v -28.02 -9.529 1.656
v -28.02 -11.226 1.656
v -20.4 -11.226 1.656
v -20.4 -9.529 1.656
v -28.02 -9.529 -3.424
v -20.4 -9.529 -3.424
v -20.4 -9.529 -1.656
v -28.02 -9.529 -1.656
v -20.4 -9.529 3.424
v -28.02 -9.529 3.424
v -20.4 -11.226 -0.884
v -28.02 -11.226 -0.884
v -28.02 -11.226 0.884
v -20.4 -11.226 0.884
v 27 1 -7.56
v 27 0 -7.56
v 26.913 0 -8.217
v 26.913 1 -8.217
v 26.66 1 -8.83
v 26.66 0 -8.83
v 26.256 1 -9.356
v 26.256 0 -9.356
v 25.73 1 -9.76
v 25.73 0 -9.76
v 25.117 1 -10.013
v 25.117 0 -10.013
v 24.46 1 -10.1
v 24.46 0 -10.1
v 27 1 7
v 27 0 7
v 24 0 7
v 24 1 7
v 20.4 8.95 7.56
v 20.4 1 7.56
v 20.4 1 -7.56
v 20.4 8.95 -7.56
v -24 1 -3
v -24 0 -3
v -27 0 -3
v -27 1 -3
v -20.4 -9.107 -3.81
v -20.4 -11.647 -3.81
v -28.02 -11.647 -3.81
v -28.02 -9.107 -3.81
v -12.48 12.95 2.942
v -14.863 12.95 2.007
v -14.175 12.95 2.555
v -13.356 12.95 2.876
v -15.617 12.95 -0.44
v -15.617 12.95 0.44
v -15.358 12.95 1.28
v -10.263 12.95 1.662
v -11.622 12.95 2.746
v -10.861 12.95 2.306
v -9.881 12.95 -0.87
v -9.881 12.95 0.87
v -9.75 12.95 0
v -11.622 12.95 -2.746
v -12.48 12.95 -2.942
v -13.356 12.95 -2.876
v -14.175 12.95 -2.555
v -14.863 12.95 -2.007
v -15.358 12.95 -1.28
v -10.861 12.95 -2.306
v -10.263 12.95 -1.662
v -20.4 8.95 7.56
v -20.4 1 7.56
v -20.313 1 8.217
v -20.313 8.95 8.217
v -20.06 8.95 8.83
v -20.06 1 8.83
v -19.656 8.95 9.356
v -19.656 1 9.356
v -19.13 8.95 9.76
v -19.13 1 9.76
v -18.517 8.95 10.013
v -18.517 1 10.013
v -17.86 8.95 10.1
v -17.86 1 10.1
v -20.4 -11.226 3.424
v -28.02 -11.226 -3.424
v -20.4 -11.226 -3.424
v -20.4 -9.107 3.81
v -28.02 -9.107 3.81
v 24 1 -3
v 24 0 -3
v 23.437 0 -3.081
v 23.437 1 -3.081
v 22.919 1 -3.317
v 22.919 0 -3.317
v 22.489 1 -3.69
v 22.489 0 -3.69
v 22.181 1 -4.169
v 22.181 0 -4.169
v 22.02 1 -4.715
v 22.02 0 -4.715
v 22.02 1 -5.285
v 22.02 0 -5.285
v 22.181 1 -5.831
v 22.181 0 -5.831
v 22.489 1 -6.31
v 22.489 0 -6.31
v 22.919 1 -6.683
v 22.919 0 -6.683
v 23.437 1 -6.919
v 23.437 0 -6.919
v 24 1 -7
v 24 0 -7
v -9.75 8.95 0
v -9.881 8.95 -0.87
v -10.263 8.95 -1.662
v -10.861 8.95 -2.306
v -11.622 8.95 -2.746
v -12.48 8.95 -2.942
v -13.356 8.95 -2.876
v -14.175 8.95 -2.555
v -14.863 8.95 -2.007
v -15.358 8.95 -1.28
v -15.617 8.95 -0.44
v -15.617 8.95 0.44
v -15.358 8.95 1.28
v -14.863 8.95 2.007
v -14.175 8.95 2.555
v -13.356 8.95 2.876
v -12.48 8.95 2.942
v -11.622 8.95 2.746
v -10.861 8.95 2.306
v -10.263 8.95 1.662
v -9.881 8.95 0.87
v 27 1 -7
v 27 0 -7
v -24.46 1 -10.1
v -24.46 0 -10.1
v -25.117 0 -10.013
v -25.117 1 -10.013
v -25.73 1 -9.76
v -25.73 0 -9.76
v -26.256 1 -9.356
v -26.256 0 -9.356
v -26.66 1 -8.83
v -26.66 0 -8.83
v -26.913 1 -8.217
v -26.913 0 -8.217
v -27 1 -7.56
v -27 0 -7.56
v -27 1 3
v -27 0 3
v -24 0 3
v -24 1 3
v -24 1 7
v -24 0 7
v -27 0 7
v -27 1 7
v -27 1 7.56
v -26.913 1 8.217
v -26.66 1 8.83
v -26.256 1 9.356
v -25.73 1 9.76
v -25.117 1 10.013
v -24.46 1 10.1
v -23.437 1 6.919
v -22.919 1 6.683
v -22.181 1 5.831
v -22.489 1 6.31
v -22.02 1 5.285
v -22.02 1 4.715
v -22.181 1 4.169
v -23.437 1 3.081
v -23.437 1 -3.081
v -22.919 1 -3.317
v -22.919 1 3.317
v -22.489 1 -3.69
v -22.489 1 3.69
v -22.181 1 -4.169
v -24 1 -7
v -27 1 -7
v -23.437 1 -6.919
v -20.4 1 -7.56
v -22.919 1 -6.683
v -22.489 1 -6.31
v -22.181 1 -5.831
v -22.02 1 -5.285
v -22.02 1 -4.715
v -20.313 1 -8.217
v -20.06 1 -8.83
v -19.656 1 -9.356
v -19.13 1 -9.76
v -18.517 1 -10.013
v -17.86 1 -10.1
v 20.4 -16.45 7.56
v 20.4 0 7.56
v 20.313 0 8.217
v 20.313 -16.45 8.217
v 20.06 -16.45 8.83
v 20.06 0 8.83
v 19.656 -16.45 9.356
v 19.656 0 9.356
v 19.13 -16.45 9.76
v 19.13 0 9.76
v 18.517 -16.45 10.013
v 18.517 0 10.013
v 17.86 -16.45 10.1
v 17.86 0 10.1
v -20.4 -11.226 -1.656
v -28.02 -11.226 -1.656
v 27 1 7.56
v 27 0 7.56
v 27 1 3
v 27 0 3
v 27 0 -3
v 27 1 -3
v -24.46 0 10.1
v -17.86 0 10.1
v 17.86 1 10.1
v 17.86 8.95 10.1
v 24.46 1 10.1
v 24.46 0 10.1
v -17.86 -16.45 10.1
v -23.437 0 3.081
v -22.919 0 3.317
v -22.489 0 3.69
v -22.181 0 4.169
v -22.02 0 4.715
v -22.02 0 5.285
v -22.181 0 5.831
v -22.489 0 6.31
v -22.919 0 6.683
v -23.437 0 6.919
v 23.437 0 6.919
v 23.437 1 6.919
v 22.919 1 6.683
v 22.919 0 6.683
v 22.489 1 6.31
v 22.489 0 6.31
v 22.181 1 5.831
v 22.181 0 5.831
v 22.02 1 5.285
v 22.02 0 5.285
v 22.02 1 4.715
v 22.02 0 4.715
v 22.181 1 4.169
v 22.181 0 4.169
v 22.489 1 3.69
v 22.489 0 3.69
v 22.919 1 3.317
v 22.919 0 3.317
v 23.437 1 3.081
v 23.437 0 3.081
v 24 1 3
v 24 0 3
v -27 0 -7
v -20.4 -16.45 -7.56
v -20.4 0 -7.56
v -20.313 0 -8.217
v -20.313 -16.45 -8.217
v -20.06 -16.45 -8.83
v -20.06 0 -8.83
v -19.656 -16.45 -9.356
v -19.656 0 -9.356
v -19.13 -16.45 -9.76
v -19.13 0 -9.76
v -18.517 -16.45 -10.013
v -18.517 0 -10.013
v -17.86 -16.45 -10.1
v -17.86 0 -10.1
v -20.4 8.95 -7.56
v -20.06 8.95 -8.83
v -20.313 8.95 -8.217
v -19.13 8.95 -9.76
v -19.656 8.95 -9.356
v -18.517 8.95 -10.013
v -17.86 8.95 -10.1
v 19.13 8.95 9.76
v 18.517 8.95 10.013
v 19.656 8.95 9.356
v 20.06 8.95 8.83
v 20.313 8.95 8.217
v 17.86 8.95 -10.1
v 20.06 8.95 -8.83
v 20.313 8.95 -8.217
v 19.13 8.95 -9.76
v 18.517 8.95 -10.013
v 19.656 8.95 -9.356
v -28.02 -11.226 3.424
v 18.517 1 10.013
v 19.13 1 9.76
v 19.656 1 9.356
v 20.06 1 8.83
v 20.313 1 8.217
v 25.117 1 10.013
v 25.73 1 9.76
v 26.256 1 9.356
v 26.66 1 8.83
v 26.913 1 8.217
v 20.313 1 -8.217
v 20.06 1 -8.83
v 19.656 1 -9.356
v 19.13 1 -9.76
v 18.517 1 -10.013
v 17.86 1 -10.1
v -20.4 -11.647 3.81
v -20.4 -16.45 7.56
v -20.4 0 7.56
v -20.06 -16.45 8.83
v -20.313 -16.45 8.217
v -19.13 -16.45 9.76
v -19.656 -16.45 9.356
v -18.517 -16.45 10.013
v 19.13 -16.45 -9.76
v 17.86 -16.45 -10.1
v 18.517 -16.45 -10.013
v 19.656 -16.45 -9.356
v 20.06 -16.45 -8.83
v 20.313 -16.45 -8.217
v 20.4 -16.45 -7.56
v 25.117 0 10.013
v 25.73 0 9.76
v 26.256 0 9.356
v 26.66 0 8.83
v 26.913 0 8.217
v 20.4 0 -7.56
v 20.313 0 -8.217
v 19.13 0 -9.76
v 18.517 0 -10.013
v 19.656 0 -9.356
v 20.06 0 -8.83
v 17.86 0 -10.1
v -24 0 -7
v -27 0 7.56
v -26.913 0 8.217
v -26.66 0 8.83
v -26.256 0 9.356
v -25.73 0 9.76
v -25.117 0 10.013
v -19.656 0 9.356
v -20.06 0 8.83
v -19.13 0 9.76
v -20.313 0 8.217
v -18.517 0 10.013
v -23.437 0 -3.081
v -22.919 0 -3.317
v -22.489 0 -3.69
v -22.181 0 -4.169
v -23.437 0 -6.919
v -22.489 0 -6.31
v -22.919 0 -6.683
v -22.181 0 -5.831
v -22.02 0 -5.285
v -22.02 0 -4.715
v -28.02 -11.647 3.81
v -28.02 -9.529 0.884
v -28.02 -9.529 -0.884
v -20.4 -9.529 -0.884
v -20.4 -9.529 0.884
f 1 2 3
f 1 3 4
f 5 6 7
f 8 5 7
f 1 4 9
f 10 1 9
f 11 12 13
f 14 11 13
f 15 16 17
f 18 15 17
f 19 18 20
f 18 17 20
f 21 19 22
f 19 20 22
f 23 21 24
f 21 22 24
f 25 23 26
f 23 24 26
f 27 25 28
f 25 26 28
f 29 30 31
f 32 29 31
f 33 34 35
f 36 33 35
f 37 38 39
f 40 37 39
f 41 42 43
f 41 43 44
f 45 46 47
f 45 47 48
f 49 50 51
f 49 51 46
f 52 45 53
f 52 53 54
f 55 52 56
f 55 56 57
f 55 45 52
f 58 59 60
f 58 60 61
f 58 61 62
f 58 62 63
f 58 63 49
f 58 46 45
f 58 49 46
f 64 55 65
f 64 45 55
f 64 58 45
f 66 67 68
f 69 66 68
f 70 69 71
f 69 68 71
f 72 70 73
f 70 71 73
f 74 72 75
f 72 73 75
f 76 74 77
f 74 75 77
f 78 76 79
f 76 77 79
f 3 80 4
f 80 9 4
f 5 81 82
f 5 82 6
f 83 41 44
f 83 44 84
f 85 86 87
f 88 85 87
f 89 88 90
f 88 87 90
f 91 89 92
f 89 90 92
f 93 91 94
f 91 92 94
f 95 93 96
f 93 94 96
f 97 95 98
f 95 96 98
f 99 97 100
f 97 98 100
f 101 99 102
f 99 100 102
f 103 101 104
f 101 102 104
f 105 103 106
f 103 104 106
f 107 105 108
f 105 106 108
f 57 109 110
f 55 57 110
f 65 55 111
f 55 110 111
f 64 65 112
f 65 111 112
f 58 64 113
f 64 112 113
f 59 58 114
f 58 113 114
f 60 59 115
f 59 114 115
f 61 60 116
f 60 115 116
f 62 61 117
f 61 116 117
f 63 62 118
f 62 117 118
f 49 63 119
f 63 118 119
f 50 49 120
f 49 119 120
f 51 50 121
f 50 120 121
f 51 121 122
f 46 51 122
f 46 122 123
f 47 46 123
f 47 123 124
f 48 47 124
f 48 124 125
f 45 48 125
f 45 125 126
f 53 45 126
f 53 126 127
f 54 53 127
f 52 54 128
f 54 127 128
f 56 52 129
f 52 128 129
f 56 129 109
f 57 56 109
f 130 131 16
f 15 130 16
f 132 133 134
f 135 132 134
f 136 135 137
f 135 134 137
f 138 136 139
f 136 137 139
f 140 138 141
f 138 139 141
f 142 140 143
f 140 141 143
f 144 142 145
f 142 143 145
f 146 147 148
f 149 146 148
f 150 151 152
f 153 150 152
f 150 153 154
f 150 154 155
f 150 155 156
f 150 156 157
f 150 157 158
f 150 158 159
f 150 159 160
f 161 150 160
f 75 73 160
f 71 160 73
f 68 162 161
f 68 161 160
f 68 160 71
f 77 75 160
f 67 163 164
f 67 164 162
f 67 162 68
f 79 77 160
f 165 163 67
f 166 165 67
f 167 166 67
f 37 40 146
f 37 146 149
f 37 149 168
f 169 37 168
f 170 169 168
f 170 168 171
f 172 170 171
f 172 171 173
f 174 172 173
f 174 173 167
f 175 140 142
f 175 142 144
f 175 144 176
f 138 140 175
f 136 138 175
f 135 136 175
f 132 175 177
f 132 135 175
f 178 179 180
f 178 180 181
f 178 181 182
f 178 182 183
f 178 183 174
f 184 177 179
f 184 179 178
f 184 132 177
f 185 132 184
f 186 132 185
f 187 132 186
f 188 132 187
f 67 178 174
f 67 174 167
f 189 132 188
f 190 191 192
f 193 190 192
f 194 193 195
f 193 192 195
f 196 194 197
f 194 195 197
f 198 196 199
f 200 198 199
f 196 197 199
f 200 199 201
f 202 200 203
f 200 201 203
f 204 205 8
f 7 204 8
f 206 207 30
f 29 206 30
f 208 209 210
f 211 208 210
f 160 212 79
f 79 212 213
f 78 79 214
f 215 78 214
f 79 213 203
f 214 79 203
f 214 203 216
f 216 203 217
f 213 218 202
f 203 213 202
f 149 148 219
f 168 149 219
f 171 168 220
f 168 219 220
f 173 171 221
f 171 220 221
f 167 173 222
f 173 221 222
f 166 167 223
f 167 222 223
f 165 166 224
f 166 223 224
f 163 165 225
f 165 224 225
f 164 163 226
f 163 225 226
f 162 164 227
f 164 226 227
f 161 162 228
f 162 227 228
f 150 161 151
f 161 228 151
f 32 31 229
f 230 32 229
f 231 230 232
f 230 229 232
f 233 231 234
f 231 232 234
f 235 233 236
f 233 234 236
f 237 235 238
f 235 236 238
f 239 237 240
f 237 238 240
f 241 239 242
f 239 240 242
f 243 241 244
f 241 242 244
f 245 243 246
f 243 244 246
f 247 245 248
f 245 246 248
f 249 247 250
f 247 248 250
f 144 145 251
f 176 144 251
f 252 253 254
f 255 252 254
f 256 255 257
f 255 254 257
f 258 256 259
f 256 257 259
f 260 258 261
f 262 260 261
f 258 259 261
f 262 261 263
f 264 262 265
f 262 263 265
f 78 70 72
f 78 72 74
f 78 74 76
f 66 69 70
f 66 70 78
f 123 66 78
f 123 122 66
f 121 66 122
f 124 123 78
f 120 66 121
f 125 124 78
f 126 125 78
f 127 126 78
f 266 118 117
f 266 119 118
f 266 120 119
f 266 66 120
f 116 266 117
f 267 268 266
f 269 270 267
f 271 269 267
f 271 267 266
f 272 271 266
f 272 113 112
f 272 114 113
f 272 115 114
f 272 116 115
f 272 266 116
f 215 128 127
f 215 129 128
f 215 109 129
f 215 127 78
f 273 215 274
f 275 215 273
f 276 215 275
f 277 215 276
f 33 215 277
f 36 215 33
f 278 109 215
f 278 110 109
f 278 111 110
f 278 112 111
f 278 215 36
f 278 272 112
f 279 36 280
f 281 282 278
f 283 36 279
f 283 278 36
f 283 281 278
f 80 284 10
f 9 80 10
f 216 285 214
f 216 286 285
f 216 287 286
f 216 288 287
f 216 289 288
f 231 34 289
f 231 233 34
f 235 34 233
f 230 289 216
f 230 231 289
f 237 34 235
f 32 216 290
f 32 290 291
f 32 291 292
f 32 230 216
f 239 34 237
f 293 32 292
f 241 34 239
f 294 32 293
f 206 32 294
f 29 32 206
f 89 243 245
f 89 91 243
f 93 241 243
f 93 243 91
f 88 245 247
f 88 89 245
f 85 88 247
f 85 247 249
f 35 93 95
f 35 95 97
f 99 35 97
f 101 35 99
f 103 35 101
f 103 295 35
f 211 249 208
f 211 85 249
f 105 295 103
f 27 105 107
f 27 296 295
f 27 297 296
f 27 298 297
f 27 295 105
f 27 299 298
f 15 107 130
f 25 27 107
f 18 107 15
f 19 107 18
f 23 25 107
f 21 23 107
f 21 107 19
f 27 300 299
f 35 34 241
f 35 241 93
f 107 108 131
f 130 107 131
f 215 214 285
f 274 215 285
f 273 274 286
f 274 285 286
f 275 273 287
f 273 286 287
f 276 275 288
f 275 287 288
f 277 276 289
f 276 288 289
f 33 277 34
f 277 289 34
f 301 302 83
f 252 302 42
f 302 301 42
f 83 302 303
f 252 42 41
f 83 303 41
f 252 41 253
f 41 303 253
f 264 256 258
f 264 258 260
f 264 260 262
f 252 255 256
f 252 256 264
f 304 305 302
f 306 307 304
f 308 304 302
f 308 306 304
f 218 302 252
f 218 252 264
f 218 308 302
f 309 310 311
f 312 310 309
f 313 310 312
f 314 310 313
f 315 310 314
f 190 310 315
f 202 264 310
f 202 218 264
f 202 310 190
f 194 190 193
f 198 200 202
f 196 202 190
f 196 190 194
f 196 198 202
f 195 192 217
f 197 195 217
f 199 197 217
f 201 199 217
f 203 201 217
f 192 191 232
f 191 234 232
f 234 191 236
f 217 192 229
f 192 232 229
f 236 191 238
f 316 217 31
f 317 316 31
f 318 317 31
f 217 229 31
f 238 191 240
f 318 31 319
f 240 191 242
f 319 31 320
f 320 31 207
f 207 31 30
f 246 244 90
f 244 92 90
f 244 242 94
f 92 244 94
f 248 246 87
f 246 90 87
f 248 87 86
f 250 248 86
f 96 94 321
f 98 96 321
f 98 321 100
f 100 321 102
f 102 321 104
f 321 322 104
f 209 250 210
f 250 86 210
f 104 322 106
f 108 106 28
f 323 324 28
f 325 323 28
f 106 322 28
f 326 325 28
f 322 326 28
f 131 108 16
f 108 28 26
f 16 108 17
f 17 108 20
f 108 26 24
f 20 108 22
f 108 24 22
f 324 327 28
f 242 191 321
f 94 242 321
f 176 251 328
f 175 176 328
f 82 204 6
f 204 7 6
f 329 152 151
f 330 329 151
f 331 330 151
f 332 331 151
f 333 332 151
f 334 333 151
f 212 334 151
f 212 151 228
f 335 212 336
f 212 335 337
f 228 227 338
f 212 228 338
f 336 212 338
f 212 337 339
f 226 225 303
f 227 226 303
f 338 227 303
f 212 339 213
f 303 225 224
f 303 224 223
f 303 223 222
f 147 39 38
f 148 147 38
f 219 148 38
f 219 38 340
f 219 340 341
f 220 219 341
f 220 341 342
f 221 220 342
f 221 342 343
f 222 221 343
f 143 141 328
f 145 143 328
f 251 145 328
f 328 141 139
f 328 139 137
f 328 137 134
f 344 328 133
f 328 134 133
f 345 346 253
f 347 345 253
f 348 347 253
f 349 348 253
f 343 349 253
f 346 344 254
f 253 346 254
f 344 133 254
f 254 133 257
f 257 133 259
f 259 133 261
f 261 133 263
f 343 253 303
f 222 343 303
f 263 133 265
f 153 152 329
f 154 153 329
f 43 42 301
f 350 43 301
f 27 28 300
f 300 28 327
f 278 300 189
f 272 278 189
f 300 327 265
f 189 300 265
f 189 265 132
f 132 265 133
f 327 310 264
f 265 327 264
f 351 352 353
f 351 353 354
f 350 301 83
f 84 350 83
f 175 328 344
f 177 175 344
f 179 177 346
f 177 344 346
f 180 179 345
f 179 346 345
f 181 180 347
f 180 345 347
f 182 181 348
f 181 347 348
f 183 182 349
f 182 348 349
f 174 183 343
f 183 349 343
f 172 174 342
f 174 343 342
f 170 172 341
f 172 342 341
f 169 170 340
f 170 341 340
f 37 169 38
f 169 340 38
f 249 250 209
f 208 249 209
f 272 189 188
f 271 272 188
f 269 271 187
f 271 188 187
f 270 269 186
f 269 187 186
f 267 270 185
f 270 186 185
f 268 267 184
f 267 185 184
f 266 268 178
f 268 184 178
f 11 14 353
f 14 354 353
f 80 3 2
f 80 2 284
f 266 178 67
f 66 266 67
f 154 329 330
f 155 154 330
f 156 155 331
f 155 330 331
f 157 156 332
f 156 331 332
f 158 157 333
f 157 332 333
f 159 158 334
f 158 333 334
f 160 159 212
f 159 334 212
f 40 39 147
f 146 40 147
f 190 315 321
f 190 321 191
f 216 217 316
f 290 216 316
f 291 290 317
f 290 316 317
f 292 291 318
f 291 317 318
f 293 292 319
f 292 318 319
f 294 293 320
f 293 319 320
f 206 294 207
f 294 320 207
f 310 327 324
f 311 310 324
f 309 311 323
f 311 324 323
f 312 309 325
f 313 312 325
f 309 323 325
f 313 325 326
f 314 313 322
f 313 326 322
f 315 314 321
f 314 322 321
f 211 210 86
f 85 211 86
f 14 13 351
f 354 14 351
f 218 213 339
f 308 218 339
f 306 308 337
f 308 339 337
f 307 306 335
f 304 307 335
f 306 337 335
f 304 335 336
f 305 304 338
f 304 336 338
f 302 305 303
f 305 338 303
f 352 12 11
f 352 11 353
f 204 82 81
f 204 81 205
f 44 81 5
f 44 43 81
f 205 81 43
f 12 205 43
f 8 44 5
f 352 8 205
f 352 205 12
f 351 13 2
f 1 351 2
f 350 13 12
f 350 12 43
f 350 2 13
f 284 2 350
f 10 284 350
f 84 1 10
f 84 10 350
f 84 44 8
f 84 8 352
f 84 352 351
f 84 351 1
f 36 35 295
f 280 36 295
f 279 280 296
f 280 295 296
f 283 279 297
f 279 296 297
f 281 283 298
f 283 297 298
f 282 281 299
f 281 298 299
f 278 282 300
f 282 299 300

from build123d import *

# Parameters (mm, degrees)
BOSS_EXTRUDE1_DEPTH = 1
BOSS_EXTRUDE2_DEPTH = 7.95
BOSS_EXTRUDE3_START = 16.45
BOSS_EXTRUDE3_DEPTH = 16.45
SKETCH5_W           = 7.62
SKETCH5_H           = 2.54
SKETCH5_W_2         = 1.768524962
SKETCH5_H_2         = 1.697224475
BOSS_EXTRUDE4_DEPTH = 7.62
SKETCH6_R           = 2.95
BOSS_EXTRUDE5_DEPTH = 4


with BuildPart() as part:
    # Sketch1 → Boss-Extrude1 (new body)
    with BuildSketch(Plane(origin=(0, 0, 0), x_dir=(1, 0, 0), z_dir=(0, 1, 0))):
        with BuildLine():
            ThreePointArc((-27, -7.56), (-26.256051224, -9.356051224), (-24.46, -10.1))
            Line((-24.46, -10.1), (24.46, -10.1))
            ThreePointArc((24.46, -10.1), (26.256051224, -9.356051224), (27, -7.56))
            Line((27, -7.56), (27, -7))
            Line((27, -7), (24, -7))
            ThreePointArc((24, -7), (22, -5), (24, -3))
            Line((24, -3), (27, -3))
            Line((27, -3), (27, 3))
            Line((27, 3), (24, 3))
            ThreePointArc((24, 3), (22, 5), (24, 7))
            Line((24, 7), (27, 7))
            Line((27, 7), (27, 7.56))
            ThreePointArc((27, 7.56), (26.256051224, 9.356051224), (24.46, 10.1))
            Line((24.46, 10.1), (-24.46, 10.1))
            ThreePointArc((-24.46, 10.1), (-26.256051224, 9.356051224), (-27, 7.56))
            Line((-27, 7.56), (-27, 7))
            Line((-27, 7), (-24, 7))
            ThreePointArc((-24, 7), (-22, 5), (-24, 3))
            Line((-24, 3), (-27, 3))
            Line((-27, 3), (-27, -3))
            Line((-27, -3), (-24, -3))
            ThreePointArc((-24, -3), (-22, -5), (-24, -7))
            Line((-24, -7), (-27, -7))
            Line((-27, -7), (-27, -7.56))
        make_face()
    extrude(amount=BOSS_EXTRUDE1_DEPTH)

    # Sketch3 → Boss-Extrude2 (add)
    with BuildSketch(Plane(origin=(0, 1, 0), x_dir=(1, 0, 0), z_dir=(0, 1, 0))):
        with BuildLine():
            Line((-17.86, -10.1), (17.86, -10.1))
            ThreePointArc((17.86, -10.1), (19.656051224, -9.356051224), (20.4, -7.56))
            Line((20.4, -7.56), (20.4, 7.56))
            ThreePointArc((20.4, 7.56), (19.656051224, 9.356051224), (17.86, 10.1))
            Line((17.86, 10.1), (-17.86, 10.1))
            ThreePointArc((-17.86, 10.1), (-19.656051224, 9.356051224), (-20.4, 7.56))
            Line((-20.4, 7.56), (-20.4, -7.56))
            ThreePointArc((-20.4, -7.56), (-19.656051224, -9.356051224), (-17.86, -10.1))
        make_face()
    extrude(amount=BOSS_EXTRUDE2_DEPTH)

    # Sketch4 → Boss-Extrude3 (add)
    with BuildSketch(Plane.XZ.offset(BOSS_EXTRUDE3_START)):
        with BuildLine():
            Line((-17.86, -10.1), (17.86, -10.1))
            ThreePointArc((17.86, -10.1), (19.656051224, -9.356051224), (20.4, -7.56))
            Line((20.4, -7.56), (20.4, 7.56))
            ThreePointArc((20.4, 7.56), (19.656051224, 9.356051224), (17.86, 10.1))
            Line((17.86, 10.1), (-17.86, 10.1))
            ThreePointArc((-17.86, 10.1), (-19.656051224, 9.356051224), (-20.4, 7.56))
            Line((-20.4, 7.56), (-20.4, -7.56))
            ThreePointArc((-20.4, -7.56), (-19.656051224, -9.356051224), (-17.86, -10.1))
        make_face()
    extrude(amount=-BOSS_EXTRUDE3_DEPTH)

    # Sketch5 → Boss-Extrude4 (add)
    with BuildSketch(Plane.ZY.offset(20.4)):
        with Locations((0, -10.377289394)):
            Rectangle(SKETCH5_W, SKETCH5_H)
        with Locations((0, -10.377289394)):
            Rectangle(SKETCH5_W_2, SKETCH5_H_2, mode=Mode.SUBTRACT)
        with Locations((-2.54, -10.377289394)):
            Rectangle(SKETCH5_W_2, SKETCH5_H_2, mode=Mode.SUBTRACT)
        with Locations((2.54, -10.377289394)):
            Rectangle(SKETCH5_W_2, SKETCH5_H_2, mode=Mode.SUBTRACT)
    extrude(amount=BOSS_EXTRUDE4_DEPTH)

    # Sketch6 → Boss-Extrude5 (add)
    with BuildSketch(Plane(origin=(0, 8.95, 0), x_dir=(1, 0, 0), z_dir=(0, 1, 0))):
        with Locations((-12.7, 0)):
            Circle(SKETCH6_R)
    extrude(amount=BOSS_EXTRUDE5_DEPTH)


solid = part.part
